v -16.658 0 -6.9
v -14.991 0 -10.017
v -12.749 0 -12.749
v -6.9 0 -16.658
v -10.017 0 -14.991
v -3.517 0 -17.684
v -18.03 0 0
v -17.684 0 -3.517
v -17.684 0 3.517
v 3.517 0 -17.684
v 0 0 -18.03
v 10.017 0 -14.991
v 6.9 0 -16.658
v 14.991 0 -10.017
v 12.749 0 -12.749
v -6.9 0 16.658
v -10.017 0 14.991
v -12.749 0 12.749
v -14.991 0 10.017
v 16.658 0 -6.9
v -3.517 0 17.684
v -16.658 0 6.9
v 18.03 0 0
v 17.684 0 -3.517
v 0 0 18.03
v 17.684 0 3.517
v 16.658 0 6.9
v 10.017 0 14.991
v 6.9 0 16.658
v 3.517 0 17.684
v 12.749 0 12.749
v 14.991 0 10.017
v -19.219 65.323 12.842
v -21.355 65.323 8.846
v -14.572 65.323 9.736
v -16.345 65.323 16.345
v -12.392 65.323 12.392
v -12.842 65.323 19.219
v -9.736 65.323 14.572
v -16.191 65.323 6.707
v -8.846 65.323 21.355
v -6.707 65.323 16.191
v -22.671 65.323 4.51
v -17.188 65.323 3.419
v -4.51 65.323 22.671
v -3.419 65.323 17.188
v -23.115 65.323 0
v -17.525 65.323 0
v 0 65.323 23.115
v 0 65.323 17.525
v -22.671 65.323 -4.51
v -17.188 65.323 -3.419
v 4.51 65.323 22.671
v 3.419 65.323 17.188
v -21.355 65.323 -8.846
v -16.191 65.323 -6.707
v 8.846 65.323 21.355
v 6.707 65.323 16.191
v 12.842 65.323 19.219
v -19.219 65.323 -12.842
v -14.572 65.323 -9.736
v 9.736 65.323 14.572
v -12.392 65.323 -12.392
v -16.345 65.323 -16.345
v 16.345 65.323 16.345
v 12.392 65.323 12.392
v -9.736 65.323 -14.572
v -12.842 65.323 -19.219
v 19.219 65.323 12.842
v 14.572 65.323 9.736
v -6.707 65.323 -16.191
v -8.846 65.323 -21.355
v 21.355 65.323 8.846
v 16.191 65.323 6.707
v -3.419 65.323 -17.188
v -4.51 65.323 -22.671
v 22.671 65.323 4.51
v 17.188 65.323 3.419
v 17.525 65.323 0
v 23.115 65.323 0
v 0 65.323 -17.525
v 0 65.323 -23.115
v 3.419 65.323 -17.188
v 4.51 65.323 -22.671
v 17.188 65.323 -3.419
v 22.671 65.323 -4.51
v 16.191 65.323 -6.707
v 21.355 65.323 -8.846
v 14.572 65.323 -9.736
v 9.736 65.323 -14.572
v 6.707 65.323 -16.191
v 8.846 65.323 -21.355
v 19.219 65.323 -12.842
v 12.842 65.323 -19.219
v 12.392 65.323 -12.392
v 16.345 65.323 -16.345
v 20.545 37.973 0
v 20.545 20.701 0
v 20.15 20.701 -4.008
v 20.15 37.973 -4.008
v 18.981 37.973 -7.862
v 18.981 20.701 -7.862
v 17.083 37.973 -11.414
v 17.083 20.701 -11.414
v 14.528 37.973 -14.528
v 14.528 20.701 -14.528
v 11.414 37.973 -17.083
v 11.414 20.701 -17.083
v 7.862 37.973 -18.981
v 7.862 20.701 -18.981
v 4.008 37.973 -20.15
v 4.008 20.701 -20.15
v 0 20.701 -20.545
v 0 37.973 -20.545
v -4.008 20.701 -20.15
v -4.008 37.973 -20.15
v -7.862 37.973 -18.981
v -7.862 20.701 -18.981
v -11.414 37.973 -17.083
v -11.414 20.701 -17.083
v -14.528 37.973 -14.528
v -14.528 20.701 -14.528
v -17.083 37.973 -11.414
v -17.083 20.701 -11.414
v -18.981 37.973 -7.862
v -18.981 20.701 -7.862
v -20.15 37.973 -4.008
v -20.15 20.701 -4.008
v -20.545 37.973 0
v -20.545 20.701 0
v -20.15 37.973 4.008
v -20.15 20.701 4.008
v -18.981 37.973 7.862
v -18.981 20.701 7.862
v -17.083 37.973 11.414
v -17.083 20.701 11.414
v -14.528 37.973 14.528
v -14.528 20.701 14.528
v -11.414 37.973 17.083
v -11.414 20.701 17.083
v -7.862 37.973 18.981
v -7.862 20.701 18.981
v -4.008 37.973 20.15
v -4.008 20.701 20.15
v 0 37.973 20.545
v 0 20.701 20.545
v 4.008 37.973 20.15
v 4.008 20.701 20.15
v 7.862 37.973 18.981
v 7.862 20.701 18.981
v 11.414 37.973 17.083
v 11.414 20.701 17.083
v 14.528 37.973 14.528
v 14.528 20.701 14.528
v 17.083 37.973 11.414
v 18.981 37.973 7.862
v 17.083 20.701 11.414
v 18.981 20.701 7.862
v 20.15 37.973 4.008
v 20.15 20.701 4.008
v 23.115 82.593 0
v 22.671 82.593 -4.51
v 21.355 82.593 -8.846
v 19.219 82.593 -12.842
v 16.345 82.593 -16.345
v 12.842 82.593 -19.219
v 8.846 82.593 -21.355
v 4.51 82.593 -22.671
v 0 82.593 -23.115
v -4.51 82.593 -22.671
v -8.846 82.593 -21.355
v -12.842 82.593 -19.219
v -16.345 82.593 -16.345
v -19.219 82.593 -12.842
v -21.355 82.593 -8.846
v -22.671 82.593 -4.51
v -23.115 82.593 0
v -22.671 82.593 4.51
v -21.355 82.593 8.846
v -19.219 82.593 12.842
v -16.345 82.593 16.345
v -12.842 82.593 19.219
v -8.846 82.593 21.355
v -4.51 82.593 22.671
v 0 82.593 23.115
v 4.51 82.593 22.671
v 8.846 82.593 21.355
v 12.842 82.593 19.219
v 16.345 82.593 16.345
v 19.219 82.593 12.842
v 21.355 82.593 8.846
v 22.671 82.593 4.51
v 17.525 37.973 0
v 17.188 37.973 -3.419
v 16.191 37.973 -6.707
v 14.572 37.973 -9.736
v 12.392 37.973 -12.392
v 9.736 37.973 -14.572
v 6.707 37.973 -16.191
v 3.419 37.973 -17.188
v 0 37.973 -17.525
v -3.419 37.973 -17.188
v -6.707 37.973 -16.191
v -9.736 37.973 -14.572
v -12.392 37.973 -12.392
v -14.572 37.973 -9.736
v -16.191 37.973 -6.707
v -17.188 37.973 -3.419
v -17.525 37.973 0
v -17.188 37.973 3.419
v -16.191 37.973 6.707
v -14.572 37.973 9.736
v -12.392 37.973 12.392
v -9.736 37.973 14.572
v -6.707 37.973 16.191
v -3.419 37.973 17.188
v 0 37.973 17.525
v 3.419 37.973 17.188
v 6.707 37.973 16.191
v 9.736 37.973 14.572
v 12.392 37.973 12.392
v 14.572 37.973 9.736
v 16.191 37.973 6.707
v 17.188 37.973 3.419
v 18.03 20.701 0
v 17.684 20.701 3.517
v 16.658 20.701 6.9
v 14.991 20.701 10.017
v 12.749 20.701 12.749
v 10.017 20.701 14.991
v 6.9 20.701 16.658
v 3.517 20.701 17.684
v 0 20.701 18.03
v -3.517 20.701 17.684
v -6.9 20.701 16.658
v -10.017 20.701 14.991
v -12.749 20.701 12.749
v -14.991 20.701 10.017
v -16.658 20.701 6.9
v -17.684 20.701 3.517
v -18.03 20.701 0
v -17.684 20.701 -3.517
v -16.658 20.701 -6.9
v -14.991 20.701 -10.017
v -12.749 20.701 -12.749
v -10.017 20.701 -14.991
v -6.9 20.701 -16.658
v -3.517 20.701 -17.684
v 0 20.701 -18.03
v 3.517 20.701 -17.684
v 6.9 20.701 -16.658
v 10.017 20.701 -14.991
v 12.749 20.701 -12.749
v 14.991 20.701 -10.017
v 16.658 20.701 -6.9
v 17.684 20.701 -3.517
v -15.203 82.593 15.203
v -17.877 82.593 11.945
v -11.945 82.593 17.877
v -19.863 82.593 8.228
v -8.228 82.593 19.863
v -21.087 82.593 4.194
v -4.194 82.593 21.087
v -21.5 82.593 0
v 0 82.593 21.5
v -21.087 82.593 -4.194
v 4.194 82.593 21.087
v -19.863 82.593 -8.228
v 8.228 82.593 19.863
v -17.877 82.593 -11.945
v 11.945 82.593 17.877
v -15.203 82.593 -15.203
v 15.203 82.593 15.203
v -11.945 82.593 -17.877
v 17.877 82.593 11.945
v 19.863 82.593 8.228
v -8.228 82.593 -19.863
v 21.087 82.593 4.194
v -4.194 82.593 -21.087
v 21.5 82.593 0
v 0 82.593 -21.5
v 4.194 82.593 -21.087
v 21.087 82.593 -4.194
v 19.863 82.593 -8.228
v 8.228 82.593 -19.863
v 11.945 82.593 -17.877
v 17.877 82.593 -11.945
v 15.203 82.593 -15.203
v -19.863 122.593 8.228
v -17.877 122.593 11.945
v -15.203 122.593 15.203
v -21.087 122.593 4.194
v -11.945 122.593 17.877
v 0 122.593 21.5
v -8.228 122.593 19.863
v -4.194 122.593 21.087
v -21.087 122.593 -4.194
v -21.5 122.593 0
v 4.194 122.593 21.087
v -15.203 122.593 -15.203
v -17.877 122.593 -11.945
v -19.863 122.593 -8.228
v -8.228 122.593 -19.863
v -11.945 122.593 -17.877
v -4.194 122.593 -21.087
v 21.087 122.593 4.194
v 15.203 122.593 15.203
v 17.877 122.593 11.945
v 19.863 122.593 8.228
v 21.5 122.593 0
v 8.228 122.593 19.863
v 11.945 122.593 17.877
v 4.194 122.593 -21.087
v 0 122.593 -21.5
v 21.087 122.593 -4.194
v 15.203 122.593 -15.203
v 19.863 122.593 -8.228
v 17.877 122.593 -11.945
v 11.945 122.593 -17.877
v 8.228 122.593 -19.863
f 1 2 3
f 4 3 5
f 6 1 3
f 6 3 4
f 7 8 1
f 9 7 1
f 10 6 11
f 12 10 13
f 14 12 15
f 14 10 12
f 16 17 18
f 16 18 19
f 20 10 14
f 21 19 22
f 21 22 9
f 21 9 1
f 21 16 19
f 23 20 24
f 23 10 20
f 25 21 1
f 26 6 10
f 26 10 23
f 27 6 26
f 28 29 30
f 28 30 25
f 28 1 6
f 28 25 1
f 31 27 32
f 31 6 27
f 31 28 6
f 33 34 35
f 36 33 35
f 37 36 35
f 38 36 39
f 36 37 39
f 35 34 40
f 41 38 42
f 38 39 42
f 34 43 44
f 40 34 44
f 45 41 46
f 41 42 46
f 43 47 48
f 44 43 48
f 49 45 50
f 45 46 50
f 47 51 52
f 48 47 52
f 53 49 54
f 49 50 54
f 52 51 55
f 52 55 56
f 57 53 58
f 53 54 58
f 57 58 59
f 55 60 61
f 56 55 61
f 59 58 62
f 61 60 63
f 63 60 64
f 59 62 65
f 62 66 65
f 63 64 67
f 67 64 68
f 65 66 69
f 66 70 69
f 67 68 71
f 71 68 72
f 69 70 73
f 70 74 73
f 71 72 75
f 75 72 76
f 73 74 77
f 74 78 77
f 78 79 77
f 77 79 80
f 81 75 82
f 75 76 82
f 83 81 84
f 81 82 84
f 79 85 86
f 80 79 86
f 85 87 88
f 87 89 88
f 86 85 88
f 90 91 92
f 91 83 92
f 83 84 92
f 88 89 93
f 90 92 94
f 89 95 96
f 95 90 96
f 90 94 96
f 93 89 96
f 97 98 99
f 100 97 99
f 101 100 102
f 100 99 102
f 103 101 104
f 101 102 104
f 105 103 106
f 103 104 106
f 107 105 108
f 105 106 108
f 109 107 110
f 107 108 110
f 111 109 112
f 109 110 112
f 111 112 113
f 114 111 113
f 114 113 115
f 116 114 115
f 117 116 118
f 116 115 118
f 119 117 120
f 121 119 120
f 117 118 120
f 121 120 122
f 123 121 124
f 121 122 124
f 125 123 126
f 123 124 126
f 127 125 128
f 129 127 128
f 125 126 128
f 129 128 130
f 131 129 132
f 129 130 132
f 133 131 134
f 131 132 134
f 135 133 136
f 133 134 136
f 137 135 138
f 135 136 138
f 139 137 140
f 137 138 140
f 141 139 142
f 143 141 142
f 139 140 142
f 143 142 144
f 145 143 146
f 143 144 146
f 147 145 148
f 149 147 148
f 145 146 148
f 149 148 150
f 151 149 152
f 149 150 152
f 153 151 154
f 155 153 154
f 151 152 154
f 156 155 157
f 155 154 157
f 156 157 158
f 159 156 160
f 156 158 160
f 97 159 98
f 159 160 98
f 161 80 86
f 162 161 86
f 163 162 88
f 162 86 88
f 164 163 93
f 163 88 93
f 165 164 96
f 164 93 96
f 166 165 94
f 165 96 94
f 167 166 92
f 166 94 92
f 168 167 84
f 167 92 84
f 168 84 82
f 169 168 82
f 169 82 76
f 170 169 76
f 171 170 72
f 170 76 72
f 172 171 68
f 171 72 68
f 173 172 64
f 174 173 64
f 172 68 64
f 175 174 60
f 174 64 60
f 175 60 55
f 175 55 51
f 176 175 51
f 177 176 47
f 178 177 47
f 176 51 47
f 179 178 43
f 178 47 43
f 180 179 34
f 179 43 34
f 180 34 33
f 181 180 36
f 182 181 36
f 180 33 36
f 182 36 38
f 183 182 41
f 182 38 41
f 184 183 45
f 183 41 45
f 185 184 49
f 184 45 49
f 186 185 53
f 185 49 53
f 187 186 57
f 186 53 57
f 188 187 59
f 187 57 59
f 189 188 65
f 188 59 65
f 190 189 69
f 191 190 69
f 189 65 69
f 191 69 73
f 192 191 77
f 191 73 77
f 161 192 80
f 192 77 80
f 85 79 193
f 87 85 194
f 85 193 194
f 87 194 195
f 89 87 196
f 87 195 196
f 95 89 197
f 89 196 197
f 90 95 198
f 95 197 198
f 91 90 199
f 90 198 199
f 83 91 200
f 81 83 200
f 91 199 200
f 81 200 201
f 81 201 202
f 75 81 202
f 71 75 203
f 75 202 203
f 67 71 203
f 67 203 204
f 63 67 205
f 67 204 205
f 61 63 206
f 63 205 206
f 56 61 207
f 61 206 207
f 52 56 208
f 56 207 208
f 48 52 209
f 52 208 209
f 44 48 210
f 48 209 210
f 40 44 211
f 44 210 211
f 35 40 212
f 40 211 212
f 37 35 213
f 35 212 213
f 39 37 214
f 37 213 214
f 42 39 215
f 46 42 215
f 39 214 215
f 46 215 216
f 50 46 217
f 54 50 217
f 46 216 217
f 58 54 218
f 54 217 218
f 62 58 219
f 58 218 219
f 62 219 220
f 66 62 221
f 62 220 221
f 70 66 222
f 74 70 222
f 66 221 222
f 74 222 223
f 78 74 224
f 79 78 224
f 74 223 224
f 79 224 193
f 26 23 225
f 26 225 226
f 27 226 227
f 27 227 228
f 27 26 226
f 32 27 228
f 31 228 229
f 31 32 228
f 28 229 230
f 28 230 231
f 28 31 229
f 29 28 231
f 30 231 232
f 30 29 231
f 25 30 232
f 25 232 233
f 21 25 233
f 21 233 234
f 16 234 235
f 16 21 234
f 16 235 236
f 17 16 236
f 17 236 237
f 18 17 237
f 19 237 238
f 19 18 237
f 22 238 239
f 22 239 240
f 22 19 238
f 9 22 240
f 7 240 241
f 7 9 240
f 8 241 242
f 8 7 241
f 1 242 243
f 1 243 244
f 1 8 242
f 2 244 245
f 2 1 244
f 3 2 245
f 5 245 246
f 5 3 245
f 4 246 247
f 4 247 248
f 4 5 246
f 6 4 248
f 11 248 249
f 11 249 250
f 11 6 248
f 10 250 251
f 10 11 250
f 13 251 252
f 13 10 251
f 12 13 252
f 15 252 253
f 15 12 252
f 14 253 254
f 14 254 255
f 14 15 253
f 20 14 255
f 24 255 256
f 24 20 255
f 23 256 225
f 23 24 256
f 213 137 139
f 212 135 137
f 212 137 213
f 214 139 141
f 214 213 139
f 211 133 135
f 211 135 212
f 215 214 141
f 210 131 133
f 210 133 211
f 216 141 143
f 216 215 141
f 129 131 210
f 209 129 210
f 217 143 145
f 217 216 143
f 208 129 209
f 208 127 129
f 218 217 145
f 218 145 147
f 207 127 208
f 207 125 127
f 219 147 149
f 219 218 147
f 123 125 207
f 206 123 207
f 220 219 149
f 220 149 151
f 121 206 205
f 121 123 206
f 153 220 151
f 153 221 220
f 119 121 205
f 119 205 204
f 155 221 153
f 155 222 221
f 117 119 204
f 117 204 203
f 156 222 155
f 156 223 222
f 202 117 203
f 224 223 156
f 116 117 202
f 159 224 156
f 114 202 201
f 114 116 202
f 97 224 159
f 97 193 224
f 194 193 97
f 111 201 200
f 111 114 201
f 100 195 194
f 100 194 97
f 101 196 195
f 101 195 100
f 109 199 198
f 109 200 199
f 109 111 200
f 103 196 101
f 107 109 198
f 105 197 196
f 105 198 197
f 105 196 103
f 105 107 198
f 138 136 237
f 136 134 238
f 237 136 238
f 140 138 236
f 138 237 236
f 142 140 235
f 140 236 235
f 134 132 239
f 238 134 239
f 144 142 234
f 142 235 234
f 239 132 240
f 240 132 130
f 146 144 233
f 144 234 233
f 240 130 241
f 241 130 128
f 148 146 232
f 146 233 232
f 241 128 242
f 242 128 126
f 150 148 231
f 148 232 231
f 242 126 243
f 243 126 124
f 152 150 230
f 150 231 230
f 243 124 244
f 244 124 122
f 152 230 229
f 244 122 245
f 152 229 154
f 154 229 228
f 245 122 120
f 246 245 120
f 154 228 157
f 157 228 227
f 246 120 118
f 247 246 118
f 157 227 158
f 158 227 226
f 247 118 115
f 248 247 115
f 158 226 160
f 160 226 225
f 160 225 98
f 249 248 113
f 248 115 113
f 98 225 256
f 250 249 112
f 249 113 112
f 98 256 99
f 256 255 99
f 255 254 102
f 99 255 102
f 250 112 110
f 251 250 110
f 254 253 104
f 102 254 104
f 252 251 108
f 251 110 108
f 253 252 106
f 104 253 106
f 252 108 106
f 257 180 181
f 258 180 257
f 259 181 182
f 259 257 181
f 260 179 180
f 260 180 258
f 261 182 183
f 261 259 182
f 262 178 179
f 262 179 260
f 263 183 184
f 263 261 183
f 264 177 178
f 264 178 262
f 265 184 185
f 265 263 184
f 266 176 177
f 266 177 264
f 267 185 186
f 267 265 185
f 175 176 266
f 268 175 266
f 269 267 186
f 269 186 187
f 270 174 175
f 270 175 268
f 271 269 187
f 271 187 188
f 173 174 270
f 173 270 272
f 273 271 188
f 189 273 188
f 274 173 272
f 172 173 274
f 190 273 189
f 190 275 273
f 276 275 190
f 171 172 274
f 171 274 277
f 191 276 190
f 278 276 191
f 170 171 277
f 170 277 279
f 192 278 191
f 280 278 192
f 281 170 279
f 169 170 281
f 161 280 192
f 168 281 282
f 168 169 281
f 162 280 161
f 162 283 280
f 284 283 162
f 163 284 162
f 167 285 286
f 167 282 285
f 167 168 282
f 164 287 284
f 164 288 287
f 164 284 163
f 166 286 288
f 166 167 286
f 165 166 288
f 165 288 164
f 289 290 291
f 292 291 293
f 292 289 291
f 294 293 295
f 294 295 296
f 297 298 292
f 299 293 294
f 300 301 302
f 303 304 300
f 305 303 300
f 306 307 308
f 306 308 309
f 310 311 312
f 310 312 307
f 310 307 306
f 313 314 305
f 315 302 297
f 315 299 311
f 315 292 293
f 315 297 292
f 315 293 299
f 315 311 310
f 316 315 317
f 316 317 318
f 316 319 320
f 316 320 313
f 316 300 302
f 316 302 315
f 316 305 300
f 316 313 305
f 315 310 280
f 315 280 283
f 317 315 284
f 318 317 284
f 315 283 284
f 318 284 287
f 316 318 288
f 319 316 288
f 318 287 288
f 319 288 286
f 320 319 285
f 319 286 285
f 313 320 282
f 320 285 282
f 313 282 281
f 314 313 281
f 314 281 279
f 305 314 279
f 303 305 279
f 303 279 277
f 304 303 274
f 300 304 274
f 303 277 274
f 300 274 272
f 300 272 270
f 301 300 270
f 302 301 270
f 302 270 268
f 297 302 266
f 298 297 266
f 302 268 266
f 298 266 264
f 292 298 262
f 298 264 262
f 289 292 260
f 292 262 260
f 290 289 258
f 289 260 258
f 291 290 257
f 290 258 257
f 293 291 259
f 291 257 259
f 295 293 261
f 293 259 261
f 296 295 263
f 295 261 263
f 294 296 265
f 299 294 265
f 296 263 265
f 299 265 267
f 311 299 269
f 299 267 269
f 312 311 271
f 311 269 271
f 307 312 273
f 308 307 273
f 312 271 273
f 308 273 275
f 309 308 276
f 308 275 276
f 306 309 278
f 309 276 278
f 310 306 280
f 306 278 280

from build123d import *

# Parameters (mm, degrees)
F0_R      = 18.03
F1_DEPTH  = 20.701
F3_R      = 20.545
F4_DEPTH  = 17.272
F6_R      = 17.525
F7_DEPTH  = 27.35
F9_R      = 23.115
F10_DEPTH = 17.27
F12_R     = 21.5
F13_DEPTH = 40


with BuildPart() as f1:
    # F0 (on Front) → F1 (new body)
    with BuildSketch(Plane.XZ):
        Circle(F0_R)
    extrude(amount=-F1_DEPTH)

    # F3 (on offset) → F4 (join)
    with BuildSketch(Plane(origin=(0, 20.701, 0), x_dir=(1, 0, 0), z_dir=(0, 1, 0))):
        Circle(F3_R)
    extrude(amount=F4_DEPTH)

    # F6 (on offset) → F7 (join)
    with BuildSketch(Plane(origin=(0, 37.973, 0), x_dir=(1, 0, 0), z_dir=(0, 1, 0))):
        Circle(F6_R)
    extrude(amount=F7_DEPTH)

    # F9 (on offset) → F10 (join)
    with BuildSketch(Plane(origin=(0, 65.323, 0), x_dir=(1, 0, 0), z_dir=(0, 1, 0))):
        Circle(F9_R)
    extrude(amount=F10_DEPTH)

    # F12 (on offset) → F13 (join)
    with BuildSketch(Plane(origin=(0, 82.593, 0), x_dir=(1, 0, 0), z_dir=(0, 1, 0))):
        Circle(F12_R)
    extrude(amount=F13_DEPTH)


solid = f1.part
